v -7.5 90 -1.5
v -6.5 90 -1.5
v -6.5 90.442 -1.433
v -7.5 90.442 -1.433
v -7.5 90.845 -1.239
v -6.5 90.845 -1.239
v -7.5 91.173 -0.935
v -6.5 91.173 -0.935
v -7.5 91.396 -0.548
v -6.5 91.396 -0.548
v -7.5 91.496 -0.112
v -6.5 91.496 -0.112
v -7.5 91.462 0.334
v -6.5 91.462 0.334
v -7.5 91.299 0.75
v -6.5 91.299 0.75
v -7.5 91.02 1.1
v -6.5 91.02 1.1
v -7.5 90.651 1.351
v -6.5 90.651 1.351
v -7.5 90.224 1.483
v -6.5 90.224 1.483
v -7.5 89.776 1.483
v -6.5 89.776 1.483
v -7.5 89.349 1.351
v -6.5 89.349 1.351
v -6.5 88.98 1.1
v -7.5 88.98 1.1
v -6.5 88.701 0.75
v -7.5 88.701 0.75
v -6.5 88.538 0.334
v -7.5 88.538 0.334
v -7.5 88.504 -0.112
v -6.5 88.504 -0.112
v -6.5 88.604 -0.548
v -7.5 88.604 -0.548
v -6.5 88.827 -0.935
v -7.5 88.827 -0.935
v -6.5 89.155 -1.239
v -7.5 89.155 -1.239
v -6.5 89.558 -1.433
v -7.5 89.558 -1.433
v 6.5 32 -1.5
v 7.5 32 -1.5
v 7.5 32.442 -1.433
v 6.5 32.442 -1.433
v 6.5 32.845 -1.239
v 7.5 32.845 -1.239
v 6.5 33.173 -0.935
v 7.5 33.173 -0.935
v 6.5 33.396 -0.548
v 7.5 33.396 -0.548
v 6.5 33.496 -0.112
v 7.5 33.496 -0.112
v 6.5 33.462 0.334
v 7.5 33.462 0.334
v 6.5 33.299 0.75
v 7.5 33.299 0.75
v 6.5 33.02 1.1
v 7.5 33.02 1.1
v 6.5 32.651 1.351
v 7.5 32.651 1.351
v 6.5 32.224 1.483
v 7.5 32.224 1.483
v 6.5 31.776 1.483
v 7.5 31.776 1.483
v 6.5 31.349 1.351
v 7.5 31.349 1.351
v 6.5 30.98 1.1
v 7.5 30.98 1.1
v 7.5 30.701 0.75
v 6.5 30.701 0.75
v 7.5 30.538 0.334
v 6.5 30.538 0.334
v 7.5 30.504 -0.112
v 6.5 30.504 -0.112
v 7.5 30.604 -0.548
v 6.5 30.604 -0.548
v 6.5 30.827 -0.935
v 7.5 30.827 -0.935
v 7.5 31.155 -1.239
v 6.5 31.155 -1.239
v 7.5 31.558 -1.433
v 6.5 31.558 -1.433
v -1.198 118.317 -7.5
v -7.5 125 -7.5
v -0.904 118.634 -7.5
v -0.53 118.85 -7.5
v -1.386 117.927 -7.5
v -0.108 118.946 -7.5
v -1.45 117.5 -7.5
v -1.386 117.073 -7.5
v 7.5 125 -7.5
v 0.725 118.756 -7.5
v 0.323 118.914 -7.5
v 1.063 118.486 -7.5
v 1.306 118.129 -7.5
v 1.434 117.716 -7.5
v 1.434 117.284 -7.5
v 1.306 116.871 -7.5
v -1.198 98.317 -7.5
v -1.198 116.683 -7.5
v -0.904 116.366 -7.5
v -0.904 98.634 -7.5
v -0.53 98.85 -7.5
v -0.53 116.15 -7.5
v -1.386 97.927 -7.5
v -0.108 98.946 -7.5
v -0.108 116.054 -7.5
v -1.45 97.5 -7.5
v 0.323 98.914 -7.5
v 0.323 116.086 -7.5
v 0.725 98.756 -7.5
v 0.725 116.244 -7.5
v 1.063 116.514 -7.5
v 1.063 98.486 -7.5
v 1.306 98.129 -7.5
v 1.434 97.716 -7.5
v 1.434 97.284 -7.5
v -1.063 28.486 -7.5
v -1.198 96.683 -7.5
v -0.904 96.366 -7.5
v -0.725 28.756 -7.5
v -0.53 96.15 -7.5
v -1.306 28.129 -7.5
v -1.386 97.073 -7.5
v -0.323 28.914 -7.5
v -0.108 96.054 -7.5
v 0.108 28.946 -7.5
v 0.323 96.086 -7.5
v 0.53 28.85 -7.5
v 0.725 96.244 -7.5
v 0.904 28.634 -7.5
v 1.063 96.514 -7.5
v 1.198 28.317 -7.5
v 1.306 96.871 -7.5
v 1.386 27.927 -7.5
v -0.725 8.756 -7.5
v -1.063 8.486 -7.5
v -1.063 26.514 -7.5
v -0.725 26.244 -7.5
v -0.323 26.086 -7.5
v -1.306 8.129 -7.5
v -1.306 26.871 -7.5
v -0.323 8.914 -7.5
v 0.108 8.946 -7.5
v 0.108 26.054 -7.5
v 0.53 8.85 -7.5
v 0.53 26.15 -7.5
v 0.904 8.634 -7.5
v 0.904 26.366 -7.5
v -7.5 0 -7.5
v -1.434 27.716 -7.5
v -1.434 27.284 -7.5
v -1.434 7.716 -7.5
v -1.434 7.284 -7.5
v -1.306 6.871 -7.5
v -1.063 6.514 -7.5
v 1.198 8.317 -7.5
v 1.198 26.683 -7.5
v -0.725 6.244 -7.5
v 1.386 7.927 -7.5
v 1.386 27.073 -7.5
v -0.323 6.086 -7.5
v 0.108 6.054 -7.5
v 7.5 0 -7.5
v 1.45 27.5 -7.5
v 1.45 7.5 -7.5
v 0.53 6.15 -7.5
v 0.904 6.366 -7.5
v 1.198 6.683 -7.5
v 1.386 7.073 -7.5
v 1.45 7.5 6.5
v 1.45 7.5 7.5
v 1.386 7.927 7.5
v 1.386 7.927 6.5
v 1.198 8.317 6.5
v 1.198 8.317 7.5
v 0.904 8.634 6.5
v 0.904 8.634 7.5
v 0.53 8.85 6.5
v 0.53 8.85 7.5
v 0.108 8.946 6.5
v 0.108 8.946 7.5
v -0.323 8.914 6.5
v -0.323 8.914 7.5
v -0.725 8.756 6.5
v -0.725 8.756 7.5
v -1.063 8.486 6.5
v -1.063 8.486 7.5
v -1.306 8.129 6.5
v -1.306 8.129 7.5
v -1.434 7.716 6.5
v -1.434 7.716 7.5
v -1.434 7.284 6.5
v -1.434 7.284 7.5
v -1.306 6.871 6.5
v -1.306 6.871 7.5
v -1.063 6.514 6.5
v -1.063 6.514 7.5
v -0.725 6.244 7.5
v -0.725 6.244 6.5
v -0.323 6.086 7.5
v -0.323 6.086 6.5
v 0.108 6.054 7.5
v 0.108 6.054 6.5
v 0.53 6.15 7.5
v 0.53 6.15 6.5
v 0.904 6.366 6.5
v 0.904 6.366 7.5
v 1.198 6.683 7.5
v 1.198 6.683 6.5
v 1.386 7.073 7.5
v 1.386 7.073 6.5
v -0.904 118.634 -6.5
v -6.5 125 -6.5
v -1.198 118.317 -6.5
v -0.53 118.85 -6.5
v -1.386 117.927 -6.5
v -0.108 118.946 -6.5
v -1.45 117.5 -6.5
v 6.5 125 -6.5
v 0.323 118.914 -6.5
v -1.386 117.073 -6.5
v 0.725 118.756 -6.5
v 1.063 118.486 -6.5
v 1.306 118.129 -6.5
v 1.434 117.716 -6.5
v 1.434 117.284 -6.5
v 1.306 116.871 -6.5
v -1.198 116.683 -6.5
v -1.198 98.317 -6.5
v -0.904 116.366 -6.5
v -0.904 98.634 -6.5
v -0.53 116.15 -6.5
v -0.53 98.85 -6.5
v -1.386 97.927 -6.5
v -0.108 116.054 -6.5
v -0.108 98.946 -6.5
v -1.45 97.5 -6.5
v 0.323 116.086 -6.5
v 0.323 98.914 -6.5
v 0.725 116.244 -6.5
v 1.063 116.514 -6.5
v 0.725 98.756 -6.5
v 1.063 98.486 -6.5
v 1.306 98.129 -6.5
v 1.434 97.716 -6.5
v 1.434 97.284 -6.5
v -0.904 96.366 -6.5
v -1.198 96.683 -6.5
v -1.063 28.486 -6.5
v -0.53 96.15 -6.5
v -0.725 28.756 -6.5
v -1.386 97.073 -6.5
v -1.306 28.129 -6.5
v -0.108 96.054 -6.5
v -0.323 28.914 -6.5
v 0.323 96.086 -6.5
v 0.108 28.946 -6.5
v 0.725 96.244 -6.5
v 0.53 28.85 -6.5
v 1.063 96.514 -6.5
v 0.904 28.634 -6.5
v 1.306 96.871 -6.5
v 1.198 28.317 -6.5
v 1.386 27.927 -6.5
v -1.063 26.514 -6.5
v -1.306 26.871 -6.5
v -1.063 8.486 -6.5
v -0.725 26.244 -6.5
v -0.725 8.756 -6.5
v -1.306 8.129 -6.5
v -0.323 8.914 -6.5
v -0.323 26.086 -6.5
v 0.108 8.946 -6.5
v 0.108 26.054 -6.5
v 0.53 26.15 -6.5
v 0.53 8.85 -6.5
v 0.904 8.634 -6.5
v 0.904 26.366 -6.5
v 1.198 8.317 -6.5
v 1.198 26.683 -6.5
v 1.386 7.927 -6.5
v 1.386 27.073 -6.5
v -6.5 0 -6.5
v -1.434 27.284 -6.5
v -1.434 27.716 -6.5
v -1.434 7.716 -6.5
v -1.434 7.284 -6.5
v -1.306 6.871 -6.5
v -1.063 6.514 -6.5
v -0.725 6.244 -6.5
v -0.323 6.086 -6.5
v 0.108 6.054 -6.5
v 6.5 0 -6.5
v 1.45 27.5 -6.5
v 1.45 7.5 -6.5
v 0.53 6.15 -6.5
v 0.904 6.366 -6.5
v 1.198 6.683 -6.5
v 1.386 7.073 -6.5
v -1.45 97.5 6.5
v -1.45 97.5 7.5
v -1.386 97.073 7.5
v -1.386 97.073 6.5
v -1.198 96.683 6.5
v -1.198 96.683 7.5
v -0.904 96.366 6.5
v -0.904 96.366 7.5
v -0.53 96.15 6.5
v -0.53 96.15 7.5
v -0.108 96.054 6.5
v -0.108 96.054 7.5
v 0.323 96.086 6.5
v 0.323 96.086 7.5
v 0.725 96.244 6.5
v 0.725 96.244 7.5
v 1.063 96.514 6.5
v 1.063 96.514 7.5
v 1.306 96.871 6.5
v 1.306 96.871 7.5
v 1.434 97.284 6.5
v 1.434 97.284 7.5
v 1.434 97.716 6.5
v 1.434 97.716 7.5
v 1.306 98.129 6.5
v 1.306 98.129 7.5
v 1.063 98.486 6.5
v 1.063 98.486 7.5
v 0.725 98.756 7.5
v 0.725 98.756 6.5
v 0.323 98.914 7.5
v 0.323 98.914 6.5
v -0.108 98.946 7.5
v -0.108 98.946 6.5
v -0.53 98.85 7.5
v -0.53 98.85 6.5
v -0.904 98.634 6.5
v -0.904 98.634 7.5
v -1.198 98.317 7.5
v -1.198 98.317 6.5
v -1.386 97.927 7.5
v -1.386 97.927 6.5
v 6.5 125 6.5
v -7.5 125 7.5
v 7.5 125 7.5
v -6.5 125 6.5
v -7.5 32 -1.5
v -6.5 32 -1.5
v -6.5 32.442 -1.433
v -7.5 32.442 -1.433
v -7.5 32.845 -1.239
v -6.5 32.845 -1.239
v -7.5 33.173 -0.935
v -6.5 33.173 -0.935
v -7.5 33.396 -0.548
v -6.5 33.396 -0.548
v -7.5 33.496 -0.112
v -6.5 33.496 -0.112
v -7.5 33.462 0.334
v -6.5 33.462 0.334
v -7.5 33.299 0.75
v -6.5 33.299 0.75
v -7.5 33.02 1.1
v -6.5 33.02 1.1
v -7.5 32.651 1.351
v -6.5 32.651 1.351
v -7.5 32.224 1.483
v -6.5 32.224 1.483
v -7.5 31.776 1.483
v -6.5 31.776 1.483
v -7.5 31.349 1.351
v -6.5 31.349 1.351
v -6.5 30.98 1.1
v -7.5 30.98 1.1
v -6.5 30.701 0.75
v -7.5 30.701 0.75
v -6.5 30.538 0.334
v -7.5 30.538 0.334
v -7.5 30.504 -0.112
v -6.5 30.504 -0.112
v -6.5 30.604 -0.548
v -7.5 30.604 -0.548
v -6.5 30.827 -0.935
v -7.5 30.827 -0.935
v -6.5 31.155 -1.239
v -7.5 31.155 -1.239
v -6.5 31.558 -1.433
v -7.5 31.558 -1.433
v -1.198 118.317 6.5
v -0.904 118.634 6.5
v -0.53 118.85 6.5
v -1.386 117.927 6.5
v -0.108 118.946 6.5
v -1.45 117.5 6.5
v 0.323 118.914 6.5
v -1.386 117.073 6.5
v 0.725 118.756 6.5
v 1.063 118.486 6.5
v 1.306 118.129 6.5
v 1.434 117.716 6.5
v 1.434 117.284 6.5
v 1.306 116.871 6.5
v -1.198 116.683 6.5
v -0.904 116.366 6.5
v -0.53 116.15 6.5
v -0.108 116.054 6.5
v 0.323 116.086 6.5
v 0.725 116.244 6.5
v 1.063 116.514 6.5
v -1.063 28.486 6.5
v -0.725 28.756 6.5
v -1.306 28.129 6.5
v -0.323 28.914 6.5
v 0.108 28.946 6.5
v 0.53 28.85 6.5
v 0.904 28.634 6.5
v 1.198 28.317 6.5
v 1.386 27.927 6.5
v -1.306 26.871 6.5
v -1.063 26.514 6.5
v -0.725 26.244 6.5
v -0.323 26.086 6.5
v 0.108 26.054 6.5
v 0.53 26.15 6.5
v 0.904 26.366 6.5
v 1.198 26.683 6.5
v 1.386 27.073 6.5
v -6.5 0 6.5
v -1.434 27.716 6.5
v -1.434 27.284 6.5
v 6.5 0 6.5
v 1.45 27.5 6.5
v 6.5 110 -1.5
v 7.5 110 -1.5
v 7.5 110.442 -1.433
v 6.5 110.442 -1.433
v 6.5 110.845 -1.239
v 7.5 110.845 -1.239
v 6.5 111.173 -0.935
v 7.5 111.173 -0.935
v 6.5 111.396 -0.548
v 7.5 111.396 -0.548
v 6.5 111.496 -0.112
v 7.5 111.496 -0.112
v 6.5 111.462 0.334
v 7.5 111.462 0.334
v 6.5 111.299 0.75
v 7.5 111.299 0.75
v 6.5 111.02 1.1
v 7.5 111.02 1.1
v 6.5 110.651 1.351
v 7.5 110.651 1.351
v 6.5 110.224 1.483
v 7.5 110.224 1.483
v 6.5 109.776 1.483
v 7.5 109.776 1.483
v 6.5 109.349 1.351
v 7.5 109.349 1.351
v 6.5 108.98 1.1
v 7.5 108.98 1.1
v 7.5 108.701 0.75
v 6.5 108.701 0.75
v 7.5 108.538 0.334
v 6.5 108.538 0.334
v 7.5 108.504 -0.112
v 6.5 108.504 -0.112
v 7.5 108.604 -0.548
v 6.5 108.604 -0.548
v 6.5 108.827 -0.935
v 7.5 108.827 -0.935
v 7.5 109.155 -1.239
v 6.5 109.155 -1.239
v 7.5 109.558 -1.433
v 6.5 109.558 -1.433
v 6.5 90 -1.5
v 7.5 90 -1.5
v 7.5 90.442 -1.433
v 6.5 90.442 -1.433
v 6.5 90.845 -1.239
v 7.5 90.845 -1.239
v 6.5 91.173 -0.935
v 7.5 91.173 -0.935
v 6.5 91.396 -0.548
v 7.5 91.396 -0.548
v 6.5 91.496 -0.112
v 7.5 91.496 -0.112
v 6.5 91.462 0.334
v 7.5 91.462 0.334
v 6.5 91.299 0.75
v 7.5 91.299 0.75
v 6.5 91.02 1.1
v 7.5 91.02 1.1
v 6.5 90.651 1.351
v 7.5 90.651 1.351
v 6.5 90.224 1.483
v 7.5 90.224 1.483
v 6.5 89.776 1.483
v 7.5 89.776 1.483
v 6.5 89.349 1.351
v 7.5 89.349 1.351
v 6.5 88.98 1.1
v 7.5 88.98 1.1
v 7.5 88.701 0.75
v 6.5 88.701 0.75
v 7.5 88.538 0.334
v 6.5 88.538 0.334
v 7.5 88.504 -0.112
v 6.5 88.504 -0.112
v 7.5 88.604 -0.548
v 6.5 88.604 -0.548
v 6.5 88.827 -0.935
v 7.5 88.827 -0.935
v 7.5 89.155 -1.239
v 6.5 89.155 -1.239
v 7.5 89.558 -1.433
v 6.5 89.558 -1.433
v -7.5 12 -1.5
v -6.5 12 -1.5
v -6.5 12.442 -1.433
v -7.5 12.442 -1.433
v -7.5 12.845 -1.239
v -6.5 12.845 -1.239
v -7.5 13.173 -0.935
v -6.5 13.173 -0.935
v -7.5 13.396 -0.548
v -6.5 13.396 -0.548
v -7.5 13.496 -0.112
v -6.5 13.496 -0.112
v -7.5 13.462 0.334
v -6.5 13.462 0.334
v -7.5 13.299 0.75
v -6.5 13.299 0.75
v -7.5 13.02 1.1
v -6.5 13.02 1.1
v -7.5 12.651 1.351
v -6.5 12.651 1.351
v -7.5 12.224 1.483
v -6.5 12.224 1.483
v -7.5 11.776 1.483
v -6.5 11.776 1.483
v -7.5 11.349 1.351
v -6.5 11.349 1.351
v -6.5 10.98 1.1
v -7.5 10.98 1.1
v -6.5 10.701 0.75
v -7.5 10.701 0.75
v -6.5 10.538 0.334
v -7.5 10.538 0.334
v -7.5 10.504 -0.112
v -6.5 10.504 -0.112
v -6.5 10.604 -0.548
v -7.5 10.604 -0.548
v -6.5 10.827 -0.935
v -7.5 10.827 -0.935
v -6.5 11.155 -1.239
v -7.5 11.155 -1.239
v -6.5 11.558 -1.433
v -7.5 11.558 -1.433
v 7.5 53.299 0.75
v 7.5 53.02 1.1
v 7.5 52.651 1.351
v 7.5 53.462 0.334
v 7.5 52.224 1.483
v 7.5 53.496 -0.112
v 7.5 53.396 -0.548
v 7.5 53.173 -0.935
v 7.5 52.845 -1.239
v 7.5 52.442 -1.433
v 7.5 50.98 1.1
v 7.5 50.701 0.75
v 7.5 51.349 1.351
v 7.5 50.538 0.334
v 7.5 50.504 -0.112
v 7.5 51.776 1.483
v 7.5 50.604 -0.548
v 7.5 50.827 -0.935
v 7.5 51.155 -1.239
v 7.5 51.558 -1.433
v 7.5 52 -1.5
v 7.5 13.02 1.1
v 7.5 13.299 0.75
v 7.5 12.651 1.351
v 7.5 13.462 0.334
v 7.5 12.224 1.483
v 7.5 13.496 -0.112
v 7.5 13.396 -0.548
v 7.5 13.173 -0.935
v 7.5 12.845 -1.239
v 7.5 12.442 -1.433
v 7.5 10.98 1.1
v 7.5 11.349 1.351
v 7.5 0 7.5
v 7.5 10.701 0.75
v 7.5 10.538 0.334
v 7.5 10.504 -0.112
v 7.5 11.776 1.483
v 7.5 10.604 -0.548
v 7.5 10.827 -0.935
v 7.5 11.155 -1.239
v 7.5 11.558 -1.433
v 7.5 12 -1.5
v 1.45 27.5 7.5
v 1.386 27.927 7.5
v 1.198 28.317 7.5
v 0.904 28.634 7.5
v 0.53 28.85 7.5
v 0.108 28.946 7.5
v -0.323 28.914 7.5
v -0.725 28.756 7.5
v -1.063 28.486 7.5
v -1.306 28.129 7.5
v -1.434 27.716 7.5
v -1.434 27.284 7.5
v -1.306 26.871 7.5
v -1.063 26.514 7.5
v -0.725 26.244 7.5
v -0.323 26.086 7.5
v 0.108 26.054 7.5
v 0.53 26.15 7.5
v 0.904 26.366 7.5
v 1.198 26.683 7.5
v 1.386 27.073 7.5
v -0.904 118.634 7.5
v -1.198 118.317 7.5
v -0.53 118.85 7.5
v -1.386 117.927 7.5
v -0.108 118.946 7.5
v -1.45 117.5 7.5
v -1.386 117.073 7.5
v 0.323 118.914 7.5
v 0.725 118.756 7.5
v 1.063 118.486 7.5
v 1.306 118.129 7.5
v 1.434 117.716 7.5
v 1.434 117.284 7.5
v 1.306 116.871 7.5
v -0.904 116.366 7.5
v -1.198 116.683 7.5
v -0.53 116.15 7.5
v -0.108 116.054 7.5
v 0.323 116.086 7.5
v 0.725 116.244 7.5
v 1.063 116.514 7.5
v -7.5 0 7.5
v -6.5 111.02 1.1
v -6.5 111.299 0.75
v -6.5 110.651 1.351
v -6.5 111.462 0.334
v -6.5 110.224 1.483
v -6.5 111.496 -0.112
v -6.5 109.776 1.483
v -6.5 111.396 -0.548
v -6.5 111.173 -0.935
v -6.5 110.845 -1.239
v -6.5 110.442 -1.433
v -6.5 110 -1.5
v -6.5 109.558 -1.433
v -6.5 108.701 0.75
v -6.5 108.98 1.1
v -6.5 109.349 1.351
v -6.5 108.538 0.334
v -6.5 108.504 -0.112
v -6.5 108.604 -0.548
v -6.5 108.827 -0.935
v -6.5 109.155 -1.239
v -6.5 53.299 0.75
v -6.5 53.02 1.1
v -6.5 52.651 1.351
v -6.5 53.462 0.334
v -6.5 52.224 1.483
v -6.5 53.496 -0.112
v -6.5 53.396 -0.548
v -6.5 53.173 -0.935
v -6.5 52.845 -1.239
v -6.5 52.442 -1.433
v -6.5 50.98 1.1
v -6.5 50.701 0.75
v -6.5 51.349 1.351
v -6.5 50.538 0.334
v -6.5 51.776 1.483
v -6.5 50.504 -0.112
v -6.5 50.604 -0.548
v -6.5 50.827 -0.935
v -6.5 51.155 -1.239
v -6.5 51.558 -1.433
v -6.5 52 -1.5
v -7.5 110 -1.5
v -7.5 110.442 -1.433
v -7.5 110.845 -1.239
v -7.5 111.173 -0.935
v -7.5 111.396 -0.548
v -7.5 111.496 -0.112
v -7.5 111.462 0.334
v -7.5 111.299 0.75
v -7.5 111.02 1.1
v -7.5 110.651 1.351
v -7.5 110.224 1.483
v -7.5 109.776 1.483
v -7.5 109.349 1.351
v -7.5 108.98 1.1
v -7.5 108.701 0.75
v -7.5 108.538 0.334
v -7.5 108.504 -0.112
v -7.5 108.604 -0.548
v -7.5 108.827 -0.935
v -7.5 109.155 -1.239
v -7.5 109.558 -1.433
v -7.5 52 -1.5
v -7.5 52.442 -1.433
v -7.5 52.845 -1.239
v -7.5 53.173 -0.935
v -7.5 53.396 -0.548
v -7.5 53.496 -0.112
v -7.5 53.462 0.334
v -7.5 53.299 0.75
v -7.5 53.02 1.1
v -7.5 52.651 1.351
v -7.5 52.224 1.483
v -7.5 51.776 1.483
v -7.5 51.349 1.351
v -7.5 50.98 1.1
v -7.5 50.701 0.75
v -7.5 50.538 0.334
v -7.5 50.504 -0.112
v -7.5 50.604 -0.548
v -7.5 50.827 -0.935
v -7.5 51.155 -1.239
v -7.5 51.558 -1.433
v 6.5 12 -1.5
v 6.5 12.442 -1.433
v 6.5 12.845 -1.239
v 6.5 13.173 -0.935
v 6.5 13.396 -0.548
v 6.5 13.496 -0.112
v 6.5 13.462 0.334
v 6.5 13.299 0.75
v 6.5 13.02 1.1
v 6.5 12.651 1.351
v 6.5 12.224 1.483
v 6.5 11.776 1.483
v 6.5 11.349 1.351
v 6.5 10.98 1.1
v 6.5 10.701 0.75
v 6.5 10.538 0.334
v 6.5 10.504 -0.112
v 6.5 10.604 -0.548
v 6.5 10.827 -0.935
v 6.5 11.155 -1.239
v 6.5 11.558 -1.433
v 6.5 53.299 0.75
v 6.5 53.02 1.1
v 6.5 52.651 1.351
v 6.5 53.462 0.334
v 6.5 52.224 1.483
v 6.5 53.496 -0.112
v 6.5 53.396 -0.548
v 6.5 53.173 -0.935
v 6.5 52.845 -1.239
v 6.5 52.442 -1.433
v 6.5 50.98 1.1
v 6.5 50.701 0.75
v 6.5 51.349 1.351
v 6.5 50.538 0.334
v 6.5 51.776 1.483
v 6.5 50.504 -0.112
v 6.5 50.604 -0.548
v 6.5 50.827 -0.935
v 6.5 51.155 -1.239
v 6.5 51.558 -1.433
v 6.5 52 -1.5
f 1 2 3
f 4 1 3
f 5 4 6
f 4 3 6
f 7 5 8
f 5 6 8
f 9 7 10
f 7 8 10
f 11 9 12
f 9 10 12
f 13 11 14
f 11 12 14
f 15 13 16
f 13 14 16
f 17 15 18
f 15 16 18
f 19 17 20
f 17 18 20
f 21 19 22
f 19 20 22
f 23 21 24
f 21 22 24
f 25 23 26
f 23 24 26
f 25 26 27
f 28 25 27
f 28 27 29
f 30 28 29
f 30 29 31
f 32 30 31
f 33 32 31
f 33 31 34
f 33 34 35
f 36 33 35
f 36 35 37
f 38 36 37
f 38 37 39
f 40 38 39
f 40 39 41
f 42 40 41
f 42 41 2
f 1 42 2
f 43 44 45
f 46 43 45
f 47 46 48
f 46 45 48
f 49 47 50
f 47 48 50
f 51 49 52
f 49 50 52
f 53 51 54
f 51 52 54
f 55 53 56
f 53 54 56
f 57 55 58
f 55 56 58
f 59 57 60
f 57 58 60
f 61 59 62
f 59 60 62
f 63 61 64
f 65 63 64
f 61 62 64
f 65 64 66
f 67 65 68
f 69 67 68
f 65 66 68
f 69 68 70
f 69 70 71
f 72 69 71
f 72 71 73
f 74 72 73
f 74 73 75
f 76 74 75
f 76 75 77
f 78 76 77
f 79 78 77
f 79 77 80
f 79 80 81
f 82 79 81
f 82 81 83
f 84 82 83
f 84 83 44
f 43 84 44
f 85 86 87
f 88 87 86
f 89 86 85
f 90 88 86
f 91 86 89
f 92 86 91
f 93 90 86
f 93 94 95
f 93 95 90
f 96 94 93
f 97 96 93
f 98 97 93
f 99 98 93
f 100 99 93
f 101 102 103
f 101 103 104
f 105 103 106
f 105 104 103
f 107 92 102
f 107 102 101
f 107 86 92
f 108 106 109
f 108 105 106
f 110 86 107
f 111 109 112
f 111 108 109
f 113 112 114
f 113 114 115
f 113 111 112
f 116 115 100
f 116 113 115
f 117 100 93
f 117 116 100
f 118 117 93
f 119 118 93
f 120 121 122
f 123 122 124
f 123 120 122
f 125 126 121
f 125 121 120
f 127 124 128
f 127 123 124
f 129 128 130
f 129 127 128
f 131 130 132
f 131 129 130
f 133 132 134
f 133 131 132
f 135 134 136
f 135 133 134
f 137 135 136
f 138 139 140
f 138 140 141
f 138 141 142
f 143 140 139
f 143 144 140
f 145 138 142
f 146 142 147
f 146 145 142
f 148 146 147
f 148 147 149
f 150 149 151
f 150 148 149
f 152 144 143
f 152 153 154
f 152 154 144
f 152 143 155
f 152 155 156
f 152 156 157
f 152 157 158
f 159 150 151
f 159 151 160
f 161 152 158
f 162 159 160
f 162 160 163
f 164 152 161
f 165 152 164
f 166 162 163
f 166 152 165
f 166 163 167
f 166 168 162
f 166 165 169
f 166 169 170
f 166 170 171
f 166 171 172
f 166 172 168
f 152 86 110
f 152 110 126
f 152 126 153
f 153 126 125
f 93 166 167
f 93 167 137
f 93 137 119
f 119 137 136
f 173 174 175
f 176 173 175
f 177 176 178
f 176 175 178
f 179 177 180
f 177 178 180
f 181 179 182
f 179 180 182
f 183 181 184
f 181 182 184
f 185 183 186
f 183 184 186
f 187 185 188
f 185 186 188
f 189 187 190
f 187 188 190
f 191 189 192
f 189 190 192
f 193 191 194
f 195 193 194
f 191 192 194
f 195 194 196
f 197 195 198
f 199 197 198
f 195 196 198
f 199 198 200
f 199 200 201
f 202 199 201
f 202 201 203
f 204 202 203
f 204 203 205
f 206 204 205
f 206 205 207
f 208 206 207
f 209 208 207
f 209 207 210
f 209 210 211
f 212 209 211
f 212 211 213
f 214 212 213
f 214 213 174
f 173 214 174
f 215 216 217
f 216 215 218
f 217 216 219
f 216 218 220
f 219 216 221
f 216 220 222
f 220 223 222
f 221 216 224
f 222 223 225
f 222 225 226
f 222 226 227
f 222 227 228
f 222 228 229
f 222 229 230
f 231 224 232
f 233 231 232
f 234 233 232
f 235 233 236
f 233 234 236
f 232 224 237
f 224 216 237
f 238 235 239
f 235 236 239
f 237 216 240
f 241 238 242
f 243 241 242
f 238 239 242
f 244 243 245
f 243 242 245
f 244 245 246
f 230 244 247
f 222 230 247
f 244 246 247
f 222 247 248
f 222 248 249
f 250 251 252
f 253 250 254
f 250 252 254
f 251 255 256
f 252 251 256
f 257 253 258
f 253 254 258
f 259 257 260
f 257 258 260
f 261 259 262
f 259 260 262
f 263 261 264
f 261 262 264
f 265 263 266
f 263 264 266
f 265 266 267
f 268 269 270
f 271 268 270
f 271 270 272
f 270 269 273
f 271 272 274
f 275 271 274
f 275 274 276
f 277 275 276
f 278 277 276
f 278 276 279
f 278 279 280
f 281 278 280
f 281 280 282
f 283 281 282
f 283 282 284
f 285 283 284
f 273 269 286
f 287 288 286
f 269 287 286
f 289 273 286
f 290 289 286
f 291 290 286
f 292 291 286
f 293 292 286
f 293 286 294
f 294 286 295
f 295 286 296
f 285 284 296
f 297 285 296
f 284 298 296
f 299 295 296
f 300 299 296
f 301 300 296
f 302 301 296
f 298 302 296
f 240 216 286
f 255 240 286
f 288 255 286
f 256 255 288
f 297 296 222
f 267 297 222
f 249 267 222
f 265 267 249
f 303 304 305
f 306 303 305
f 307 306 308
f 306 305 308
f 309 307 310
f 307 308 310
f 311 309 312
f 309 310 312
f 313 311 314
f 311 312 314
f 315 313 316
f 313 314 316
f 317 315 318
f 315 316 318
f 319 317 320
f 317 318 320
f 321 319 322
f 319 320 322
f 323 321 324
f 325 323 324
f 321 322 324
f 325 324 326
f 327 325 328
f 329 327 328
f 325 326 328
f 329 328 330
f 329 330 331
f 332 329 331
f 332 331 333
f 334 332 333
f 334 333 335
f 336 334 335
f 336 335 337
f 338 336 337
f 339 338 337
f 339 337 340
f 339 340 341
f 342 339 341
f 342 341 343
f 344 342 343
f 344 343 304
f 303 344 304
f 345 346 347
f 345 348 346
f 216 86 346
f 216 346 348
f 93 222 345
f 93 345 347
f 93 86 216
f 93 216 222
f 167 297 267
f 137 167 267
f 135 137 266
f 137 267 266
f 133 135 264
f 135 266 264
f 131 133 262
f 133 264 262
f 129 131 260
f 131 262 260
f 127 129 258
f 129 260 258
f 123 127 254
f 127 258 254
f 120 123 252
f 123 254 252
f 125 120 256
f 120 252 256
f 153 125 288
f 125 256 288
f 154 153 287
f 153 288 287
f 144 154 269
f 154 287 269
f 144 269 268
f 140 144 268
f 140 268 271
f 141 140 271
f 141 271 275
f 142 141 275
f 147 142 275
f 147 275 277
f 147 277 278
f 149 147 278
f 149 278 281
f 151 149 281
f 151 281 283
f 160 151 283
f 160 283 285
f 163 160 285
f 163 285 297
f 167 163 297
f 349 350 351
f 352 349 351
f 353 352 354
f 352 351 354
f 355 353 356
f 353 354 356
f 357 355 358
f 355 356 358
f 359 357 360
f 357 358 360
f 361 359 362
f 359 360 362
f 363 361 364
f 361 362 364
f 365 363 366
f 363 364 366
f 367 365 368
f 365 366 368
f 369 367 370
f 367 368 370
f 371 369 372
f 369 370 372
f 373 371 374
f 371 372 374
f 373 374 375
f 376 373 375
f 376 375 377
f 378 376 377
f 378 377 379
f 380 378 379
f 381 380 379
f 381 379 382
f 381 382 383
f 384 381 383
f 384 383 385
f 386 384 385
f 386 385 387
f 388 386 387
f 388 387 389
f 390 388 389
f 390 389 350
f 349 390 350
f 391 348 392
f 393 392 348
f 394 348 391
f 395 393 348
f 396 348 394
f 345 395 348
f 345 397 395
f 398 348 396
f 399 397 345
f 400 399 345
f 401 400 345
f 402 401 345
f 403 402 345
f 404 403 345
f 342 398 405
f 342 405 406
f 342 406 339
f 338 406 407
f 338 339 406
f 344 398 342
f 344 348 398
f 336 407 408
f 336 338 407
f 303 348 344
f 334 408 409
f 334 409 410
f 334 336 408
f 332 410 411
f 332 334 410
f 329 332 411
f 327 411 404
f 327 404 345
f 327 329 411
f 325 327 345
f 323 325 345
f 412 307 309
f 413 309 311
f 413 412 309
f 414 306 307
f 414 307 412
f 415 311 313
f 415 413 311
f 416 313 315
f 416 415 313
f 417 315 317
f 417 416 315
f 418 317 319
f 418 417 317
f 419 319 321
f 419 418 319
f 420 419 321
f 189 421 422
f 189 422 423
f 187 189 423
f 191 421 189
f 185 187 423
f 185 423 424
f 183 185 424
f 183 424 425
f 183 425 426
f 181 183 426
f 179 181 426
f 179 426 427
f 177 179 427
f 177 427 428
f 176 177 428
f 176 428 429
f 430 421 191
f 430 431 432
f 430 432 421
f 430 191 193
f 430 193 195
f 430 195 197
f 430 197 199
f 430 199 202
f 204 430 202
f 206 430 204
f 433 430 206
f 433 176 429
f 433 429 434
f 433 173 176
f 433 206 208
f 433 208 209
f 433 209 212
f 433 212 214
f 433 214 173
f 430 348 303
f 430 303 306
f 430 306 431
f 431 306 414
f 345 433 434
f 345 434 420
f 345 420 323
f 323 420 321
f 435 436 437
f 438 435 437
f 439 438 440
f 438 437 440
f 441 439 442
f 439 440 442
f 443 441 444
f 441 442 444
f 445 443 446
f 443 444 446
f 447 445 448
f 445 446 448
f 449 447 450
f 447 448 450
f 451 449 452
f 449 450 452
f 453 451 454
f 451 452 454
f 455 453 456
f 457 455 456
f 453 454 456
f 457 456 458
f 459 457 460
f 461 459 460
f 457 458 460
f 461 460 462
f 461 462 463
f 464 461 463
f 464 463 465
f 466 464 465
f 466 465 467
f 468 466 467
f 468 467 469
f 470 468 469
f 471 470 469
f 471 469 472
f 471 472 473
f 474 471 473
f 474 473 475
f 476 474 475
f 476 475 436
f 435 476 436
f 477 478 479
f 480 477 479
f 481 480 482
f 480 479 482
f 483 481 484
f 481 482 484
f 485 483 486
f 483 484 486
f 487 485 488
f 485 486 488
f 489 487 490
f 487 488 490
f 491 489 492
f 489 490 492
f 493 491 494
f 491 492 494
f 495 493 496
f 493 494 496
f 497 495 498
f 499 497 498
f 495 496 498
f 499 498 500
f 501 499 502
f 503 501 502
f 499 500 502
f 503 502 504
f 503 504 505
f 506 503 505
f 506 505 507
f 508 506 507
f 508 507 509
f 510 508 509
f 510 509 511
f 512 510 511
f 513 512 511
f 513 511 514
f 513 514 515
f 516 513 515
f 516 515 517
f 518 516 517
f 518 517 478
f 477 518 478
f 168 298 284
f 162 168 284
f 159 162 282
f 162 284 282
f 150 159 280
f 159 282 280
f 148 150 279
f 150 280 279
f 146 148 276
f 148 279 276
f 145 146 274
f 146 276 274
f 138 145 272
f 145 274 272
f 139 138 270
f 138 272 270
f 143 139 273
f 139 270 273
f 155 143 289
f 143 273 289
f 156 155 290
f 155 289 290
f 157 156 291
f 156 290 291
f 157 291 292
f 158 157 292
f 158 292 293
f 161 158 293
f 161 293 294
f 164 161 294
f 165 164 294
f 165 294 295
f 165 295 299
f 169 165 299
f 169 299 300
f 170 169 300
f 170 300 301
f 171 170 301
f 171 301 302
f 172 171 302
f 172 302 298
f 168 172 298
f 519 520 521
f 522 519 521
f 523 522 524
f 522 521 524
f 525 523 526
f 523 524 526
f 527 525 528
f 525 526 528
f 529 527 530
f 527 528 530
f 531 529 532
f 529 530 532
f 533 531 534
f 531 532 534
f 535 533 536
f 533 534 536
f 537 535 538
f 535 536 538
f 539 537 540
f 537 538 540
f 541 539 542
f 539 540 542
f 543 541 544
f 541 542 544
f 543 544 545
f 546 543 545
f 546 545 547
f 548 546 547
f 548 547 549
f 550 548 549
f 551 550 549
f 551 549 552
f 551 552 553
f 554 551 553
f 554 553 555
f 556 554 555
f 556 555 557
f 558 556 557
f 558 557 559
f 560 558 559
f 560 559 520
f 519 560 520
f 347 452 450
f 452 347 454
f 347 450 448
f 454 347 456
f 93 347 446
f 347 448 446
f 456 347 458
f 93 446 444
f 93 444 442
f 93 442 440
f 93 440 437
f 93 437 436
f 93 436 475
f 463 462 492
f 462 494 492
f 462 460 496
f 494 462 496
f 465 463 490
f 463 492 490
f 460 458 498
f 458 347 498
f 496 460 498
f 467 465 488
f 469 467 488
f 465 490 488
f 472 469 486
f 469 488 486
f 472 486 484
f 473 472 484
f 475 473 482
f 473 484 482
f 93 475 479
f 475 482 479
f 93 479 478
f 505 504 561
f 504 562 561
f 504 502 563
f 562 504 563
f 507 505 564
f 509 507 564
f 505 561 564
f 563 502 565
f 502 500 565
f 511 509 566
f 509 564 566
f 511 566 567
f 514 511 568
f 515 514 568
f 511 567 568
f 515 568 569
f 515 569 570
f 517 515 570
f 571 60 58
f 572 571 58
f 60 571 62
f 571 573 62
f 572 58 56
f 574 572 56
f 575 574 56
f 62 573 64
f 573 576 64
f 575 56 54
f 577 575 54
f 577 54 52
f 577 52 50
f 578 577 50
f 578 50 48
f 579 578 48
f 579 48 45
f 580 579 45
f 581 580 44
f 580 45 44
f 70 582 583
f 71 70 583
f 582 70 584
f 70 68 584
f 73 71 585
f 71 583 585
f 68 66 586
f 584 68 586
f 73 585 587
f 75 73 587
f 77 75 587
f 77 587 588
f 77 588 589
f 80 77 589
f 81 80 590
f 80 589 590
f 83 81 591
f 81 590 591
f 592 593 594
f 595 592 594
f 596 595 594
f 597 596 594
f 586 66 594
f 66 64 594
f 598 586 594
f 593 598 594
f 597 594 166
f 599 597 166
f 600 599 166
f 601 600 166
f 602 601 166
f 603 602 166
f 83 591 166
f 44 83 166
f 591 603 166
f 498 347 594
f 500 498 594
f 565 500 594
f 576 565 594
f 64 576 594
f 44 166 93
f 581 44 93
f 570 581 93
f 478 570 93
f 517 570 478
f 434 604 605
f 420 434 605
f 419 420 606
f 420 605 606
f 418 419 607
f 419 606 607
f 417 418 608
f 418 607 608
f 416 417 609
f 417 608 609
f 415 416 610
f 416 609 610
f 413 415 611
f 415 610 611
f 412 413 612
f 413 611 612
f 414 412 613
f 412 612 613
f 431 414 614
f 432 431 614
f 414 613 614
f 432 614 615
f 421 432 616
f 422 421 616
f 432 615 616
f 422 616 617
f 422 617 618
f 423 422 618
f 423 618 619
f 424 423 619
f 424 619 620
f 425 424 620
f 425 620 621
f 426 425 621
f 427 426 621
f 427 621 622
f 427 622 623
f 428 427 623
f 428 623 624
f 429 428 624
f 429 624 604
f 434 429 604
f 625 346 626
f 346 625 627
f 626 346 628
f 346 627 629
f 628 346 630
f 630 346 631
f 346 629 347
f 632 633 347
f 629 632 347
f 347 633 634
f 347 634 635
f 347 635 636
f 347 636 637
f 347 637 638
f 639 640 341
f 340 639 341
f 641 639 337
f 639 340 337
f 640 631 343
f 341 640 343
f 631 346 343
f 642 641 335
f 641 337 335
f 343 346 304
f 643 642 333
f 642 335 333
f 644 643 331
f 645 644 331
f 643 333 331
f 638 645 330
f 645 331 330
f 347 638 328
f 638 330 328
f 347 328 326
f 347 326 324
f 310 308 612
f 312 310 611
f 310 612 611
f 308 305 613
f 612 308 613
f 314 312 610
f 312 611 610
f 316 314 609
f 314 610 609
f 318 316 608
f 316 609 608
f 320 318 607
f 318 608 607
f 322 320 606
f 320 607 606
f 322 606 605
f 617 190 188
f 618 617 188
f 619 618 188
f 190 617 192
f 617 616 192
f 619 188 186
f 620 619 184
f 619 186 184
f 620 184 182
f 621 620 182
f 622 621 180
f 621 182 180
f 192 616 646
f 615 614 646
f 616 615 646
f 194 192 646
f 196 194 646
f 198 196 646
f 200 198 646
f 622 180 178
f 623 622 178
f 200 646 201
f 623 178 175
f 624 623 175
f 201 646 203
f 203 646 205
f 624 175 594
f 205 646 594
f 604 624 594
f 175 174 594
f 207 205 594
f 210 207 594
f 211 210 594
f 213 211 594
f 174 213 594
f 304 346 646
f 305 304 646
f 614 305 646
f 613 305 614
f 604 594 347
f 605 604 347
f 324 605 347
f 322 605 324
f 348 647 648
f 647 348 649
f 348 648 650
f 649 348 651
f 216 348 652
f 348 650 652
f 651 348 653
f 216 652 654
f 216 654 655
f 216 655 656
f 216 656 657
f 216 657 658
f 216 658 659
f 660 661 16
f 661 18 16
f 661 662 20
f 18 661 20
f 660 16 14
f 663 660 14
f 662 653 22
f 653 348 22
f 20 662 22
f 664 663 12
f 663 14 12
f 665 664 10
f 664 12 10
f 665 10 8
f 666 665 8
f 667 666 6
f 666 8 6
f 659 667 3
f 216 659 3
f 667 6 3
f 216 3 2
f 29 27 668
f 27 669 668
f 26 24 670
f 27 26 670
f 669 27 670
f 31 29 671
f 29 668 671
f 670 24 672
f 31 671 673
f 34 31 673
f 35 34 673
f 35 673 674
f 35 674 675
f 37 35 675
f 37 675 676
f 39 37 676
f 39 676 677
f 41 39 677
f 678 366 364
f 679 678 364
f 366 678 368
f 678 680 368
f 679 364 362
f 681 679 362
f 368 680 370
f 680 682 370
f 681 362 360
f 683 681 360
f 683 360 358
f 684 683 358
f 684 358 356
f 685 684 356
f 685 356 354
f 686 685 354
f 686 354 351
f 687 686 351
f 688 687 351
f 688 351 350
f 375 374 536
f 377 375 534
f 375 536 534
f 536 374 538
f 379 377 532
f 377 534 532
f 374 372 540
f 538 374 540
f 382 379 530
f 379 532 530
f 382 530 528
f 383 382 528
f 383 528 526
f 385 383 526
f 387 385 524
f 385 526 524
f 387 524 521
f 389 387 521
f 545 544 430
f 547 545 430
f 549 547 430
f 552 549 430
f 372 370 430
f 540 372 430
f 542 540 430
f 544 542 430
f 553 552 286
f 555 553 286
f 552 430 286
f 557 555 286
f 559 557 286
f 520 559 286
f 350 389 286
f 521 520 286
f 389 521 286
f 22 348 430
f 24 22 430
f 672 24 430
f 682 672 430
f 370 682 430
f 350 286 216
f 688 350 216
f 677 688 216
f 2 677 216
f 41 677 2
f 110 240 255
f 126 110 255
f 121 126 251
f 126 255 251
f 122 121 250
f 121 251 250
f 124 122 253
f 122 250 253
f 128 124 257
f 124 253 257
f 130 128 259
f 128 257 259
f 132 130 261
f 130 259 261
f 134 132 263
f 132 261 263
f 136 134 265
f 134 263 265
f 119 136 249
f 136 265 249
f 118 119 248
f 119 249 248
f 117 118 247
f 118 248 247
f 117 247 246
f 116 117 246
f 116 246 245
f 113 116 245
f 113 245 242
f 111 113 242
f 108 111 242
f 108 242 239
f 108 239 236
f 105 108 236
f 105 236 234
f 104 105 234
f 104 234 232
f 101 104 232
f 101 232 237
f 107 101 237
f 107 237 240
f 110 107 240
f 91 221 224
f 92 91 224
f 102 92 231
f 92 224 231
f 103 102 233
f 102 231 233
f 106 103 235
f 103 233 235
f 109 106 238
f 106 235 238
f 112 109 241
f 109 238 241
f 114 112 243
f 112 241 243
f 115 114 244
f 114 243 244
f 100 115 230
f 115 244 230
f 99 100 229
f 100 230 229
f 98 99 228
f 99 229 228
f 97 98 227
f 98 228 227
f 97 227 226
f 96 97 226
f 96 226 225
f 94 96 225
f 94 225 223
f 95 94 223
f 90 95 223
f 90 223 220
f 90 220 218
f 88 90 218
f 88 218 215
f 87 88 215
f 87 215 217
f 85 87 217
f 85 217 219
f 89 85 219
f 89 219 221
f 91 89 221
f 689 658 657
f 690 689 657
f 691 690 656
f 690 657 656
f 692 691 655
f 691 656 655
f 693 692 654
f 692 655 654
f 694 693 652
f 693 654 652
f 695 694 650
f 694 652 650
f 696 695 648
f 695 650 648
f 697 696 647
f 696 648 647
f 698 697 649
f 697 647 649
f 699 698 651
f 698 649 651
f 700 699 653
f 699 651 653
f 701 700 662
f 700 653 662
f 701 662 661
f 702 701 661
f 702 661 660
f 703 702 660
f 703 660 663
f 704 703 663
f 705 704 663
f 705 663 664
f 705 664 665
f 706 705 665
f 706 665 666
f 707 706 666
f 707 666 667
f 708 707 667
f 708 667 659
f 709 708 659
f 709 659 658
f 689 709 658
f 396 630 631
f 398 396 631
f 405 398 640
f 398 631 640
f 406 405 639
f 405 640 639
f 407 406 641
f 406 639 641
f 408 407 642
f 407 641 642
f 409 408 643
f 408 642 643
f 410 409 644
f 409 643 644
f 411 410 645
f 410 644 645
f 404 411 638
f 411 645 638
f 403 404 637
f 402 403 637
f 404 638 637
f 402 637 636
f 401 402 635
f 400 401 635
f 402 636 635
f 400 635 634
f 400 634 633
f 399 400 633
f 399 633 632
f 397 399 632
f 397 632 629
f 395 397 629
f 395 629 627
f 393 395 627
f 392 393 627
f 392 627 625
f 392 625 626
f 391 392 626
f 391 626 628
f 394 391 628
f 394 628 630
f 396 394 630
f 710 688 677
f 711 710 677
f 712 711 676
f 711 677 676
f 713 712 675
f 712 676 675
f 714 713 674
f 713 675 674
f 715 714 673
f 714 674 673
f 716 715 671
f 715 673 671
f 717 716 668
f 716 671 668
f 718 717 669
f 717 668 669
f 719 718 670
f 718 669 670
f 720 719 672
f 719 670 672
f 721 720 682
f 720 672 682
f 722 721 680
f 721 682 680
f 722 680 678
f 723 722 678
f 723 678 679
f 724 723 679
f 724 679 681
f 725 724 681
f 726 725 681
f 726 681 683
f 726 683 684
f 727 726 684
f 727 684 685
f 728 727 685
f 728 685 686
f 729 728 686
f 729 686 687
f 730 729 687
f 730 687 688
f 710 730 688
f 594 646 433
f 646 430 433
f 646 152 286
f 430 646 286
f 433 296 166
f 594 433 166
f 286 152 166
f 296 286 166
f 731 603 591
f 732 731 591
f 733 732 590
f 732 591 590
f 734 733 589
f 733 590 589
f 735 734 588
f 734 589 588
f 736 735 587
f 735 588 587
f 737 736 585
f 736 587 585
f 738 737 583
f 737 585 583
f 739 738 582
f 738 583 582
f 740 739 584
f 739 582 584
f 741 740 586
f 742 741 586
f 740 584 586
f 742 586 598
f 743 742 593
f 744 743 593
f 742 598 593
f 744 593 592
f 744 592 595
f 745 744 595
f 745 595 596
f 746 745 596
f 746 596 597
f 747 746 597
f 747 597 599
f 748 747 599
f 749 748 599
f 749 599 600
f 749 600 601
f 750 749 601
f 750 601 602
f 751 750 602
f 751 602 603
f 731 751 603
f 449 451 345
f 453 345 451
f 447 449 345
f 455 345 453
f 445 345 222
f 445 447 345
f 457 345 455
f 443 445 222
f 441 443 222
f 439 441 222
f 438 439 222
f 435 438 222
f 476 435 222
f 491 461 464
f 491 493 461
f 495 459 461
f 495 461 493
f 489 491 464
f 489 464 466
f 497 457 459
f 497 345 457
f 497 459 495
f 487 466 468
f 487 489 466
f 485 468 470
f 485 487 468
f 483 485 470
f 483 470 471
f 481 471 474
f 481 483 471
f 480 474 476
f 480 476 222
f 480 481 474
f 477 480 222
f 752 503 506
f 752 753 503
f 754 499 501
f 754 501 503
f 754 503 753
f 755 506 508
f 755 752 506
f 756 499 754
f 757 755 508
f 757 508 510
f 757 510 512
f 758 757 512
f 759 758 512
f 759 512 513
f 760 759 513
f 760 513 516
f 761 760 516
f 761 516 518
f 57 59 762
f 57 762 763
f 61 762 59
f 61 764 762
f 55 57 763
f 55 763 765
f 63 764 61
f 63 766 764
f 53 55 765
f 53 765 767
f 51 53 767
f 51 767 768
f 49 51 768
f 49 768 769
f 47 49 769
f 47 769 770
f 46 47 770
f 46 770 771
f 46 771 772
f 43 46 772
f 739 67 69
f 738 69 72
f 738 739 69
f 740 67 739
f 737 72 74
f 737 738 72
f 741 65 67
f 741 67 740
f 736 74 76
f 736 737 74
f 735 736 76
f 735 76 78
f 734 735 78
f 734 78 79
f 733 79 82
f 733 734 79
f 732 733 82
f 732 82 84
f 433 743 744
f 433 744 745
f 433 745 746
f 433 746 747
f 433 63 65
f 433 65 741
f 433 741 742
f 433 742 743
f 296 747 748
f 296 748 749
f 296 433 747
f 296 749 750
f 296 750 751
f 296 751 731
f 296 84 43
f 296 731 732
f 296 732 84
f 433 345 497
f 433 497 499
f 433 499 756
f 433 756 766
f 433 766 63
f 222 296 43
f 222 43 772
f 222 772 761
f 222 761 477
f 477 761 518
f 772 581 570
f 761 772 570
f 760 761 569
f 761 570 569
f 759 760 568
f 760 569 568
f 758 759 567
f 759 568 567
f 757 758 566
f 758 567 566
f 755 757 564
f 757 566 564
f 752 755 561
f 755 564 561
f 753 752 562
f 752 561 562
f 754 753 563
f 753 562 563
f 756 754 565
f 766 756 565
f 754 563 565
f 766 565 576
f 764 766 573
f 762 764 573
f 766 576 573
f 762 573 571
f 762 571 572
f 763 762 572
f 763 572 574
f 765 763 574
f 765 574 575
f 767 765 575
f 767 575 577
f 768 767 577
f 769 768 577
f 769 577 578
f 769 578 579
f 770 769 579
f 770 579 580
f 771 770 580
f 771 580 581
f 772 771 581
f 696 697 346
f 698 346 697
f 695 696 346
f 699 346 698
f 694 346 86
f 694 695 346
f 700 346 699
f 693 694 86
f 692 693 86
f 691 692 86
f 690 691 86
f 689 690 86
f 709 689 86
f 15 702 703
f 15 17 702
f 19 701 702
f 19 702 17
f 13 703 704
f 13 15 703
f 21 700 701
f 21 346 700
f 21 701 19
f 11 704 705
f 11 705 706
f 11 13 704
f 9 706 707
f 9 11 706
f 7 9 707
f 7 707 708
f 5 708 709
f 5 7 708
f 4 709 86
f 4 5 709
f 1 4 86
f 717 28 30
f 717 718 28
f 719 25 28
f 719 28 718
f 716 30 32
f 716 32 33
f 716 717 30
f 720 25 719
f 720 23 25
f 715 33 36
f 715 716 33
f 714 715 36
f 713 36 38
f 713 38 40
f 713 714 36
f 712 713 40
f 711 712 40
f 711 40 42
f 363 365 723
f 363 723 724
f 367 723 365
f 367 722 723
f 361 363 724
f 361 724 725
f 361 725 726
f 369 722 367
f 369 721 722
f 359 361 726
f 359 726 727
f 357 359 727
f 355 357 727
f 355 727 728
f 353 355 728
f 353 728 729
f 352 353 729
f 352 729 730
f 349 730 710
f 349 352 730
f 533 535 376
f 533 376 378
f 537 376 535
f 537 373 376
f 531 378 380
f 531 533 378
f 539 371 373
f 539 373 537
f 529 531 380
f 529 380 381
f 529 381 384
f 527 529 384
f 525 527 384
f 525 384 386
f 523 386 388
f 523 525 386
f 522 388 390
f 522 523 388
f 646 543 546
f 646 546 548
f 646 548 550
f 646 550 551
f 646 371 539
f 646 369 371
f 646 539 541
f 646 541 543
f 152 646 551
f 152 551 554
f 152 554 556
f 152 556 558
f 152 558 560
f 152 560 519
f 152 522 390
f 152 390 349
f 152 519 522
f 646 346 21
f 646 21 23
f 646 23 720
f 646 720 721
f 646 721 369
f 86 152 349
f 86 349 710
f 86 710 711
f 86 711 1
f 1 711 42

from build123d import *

# Parameters (mm, degrees)
SKETCH_1_W          = 15
SKETCH_1_H          = 15
SKETCH_1_W_2        = 13
SKETCH_1_H_2        = 13
EXTRUDE_1_DEPTH     = 125
SKETCH_2_R          = 1.45
CUT_EXTRUDE_1_DEPTH = 127.119982556
SKETCH_3_R          = 1.5
CUT_EXTRUDE_2_DEPTH = 127.119982556


with BuildPart() as part:
    # 草图1 → 拉伸-薄壁1 (new body)
    with BuildSketch(Plane(origin=(0, 0, 0), x_dir=(1, 0, 0), z_dir=(0, 1, 0))):
        Rectangle(SKETCH_1_W, SKETCH_1_H)
        Rectangle(SKETCH_1_W_2, SKETCH_1_H_2, mode=Mode.SUBTRACT)
    extrude(amount=EXTRUDE_1_DEPTH)

    # 草图2 → 切除-拉伸1 (cut, through all)
    with BuildSketch(Plane.XY.offset(7.5)):
        with Locations((0, 7.5)):
            Circle(SKETCH_2_R)
        with Locations((0, 27.5)):
            Circle(SKETCH_2_R)
        with Locations(Location((0, 97.5, 0), (0, 0, 180))):
            Circle(SKETCH_2_R)
        with Locations(Location((0, 117.5, 0), (0, 0, 180))):
            Circle(SKETCH_2_R)
    extrude(amount=-CUT_EXTRUDE_1_DEPTH, mode=Mode.SUBTRACT)

    # 草图3 → 切除-拉伸2 (cut, through all)
    with BuildSketch(Plane(origin=(7.5, 0, 0), x_dir=(0, 0, -1), z_dir=(1, 0, 0))):
        with Locations((0, 32)):
            Circle(SKETCH_3_R)
        with Locations((0, 12)):
            Circle(SKETCH_3_R)
        with Locations((0, 52)):
            Circle(SKETCH_3_R)
        with Locations((0, 110)):
            Circle(SKETCH_3_R)
        with Locations((0, 90)):
            Circle(SKETCH_3_R)
    extrude(amount=-CUT_EXTRUDE_2_DEPTH, mode=Mode.SUBTRACT)


solid = part.part
